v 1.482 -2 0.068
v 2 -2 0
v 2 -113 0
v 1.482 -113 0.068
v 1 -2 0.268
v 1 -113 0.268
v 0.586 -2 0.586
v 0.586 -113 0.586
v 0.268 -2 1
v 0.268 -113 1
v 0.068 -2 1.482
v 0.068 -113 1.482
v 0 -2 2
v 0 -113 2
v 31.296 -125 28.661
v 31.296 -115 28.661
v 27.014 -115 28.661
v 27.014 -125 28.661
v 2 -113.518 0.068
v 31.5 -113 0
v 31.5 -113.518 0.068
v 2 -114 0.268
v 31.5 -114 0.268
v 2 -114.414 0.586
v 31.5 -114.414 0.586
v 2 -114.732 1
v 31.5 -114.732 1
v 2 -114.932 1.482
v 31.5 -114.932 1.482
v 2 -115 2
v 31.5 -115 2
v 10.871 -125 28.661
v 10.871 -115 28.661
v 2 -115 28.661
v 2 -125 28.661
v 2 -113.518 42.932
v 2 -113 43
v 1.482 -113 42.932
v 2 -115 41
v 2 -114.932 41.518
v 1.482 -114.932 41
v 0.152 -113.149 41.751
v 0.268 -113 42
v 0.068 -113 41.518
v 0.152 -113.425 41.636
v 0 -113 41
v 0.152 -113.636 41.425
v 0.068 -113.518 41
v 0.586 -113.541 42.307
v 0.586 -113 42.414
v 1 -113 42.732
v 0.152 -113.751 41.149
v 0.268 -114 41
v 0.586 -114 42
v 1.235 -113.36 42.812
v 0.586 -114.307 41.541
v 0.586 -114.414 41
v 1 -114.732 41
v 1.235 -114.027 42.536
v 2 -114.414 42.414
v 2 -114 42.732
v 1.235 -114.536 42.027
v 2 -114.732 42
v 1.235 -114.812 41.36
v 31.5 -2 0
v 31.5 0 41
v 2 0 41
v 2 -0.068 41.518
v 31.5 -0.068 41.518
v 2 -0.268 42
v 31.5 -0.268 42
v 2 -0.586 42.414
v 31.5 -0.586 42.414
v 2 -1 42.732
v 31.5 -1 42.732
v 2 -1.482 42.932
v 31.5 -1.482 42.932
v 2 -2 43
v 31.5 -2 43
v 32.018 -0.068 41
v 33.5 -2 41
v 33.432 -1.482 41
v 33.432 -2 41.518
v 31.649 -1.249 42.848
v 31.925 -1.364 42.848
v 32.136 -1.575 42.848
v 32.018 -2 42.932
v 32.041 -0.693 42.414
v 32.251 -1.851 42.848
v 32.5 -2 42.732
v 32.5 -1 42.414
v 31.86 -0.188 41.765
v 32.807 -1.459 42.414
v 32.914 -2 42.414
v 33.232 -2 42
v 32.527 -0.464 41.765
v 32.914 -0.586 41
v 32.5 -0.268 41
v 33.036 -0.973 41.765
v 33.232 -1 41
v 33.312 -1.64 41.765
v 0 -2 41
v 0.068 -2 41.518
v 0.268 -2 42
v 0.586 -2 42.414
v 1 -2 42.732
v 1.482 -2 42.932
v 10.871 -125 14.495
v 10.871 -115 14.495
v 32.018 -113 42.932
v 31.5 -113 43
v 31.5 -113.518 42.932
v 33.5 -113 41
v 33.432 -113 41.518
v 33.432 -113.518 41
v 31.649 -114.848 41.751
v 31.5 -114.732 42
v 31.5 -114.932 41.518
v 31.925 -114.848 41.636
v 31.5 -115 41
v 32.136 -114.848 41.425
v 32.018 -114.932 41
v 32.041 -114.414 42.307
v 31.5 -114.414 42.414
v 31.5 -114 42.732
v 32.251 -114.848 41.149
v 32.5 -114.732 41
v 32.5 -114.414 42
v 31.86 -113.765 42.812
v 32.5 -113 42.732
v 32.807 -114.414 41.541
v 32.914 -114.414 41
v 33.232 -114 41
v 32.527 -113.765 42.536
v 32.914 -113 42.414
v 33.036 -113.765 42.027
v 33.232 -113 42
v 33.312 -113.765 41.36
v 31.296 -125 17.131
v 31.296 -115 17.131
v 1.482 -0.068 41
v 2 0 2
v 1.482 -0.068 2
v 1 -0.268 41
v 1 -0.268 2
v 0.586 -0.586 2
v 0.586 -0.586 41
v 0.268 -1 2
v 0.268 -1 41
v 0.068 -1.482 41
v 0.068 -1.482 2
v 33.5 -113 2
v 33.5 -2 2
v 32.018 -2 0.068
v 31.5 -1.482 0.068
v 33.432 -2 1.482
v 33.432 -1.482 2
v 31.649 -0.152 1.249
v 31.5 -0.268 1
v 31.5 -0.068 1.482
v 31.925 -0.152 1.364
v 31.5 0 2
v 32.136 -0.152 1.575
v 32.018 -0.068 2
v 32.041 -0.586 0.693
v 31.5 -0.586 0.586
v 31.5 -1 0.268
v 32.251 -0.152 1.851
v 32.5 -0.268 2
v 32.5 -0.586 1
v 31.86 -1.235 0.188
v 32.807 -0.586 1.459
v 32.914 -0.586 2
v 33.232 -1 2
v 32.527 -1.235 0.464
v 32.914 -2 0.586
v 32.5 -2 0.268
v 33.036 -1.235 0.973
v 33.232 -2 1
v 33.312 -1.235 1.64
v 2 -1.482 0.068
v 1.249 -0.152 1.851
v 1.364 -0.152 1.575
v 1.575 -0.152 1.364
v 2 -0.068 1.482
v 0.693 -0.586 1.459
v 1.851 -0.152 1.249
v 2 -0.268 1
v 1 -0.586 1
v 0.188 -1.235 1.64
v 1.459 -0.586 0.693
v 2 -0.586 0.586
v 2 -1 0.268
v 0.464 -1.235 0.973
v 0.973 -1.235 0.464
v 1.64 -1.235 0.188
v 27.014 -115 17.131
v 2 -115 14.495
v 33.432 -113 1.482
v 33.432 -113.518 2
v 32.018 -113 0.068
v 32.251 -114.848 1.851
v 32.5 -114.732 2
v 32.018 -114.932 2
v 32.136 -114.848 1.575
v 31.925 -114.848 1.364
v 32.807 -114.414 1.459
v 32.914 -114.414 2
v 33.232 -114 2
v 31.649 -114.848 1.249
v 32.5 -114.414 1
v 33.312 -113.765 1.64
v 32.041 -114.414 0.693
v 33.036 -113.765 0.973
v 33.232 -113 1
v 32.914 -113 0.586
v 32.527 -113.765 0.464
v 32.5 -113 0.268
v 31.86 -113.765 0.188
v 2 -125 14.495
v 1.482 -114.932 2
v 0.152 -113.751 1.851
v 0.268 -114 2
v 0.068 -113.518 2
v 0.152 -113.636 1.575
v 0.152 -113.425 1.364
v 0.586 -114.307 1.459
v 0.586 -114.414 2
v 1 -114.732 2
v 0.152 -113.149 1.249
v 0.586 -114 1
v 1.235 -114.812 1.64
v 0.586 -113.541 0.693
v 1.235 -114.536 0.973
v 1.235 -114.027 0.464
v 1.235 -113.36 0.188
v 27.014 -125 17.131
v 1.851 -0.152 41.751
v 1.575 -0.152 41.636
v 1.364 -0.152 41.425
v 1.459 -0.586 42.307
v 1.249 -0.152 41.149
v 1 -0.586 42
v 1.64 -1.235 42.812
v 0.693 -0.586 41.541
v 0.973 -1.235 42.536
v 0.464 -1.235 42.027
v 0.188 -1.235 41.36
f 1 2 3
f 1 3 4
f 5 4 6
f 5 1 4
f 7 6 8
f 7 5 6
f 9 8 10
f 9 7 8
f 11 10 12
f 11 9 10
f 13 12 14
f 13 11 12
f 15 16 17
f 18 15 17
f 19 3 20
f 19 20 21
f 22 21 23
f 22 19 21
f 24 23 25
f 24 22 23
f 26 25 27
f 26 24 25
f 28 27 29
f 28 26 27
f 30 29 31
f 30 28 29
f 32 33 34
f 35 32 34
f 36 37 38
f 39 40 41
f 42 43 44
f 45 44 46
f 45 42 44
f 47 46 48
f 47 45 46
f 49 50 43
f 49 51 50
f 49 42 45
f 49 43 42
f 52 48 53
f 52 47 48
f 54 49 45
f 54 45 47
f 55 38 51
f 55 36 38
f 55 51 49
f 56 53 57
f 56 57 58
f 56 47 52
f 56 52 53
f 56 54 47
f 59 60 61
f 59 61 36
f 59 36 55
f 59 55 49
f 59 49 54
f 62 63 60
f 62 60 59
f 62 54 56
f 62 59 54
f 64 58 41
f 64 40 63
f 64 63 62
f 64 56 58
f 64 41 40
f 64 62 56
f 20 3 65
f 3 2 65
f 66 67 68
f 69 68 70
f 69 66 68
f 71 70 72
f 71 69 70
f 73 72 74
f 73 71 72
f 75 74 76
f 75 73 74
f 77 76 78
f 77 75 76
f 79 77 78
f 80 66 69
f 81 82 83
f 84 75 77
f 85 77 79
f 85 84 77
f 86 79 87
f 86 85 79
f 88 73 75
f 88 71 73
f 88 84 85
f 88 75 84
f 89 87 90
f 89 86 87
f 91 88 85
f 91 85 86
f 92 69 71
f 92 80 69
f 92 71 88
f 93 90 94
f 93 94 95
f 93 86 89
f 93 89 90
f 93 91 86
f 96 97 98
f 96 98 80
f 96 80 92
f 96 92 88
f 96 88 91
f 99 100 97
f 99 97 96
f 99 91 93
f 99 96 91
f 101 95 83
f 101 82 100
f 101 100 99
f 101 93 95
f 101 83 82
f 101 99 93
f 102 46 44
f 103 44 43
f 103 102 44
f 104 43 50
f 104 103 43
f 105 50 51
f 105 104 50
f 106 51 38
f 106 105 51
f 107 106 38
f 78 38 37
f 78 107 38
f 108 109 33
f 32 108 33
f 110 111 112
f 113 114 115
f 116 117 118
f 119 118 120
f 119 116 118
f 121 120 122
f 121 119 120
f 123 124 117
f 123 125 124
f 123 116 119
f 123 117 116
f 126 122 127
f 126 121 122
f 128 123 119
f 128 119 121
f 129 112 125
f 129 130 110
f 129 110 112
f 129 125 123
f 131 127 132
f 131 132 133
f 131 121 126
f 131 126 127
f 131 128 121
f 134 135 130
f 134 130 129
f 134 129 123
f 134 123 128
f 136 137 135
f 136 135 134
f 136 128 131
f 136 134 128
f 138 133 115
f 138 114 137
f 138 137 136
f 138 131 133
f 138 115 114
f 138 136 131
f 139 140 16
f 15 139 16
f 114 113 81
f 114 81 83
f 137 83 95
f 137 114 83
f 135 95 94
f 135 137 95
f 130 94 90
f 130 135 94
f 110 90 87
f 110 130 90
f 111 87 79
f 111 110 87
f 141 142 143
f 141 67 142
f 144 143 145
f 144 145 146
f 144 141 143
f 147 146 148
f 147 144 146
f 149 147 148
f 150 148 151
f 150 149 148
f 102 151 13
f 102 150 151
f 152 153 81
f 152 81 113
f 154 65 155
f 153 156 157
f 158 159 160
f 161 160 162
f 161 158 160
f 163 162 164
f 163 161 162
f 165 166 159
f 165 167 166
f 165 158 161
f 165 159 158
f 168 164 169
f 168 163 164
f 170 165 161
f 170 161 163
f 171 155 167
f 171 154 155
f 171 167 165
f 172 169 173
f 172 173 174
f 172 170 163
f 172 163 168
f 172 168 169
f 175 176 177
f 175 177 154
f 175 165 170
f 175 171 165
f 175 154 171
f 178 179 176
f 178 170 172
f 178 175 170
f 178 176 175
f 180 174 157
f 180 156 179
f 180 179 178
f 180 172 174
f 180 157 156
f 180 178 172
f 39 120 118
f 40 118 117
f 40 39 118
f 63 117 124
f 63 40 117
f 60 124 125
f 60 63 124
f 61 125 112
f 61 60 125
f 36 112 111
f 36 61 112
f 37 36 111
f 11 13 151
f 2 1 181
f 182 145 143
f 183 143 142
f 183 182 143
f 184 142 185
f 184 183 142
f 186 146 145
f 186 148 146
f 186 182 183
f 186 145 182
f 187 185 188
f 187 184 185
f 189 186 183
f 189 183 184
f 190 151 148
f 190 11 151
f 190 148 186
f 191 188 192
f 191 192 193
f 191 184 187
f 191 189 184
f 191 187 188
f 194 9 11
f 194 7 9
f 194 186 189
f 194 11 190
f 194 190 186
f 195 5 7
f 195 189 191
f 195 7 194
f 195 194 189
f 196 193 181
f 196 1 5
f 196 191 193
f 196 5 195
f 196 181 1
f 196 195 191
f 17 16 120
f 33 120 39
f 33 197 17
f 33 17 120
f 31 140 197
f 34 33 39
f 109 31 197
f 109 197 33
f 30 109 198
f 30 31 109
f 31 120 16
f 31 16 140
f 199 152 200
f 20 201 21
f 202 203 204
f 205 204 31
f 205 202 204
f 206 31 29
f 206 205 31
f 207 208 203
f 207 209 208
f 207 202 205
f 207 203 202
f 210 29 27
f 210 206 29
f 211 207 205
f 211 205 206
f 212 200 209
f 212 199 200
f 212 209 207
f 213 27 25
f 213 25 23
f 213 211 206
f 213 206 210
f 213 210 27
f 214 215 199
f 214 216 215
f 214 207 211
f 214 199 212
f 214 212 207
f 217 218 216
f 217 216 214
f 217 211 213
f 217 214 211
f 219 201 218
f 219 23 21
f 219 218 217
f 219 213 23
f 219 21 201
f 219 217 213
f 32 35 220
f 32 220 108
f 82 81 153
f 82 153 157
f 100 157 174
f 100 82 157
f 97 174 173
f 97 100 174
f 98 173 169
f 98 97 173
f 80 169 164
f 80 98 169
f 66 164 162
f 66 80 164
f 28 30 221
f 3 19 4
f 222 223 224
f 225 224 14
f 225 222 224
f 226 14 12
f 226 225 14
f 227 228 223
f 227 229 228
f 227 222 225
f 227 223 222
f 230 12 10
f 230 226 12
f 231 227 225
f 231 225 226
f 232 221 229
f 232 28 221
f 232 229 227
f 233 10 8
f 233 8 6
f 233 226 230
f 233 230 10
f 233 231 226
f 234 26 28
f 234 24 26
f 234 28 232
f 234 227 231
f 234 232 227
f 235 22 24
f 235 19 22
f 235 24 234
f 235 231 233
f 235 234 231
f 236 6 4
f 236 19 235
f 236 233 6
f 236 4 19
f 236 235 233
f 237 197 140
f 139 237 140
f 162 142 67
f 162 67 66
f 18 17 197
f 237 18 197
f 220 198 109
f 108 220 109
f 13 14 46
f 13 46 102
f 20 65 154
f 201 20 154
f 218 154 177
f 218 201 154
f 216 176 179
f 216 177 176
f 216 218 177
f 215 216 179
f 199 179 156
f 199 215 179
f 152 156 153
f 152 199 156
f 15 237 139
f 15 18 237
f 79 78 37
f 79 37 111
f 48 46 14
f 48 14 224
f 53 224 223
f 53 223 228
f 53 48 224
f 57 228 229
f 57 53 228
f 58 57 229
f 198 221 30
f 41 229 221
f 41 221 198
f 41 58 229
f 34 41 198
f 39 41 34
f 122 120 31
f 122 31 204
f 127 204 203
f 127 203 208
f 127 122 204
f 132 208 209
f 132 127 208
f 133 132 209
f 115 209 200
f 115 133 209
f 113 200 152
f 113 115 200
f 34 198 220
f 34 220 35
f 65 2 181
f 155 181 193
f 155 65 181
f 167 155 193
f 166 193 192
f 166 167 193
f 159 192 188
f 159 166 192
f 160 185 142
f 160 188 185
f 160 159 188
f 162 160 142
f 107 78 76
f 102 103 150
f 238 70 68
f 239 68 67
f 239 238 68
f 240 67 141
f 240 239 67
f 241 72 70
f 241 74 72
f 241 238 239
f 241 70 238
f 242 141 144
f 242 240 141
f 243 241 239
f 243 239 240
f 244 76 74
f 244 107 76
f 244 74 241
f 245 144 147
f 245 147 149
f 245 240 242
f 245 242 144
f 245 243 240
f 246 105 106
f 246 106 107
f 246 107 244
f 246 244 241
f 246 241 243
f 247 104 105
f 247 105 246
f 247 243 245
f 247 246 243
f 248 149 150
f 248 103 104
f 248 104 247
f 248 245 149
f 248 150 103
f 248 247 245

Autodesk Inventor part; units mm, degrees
ref_plane "YZ Plane" through (0, 0, 0) normal (1, 0, 0) x (0, 1, 0)
ref_plane "XZ Plane" through (0, 0, 0) normal (0, 1, 0) x (-1, 0, 0)
ref_plane "XY Plane" through (0, 0, 0) normal (0, 0, 1) x (1, 0, 0)
sketch "Sketch1" plane through (0, 0, 0) normal (0, 0, 1) x (1, 0, 0)
  line L0 (0, 0) -> (33.5, 0)
  line L1 (33.5, 0) -> (33.5, -115)
  line L2 (33.5, -115) -> (0, -115)
  line L3 (0, -115) -> (0, 0)
  dimension "d0" = 115
  dimension "d1" = 33.5
extrude "Extrusion1" add sketch "Sketch1" along normal blind 43
fillet "Fillet1" radius 2 12 edges at (33.5, -57.5, 0) (33.5, 0, 21.5) (33.5, -57.5, 43) (33.5, -115, 21.5) (16.75, -115, 0) (16.75, -115, 43) (0, -115, 21.5) (0, -57.5, 0) (0, -57.5, 43) (0, 0, 21.5) (16.75, 0, 0) (16.75, 0, 43)
sketch "Sketch2" plane through (2, -115, 41) normal (0, -1, 0) x (1, 0, 0)
  line L0 (0, -39) -> (0, 0) projected
  line L1 (0, -26.5048) -> (8.8714, -26.5048)
  line L2 (8.8714, -26.5048) -> (8.8714, -12.339)
  line L3 (8.8714, -12.339) -> (0, -12.339)
  line L4 (0, -12.339) -> (0, -26.5048)
  line L5 (25.0138, -23.8693) -> (29.2965, -23.8693)
  line L6 (29.2965, -23.8693) -> (29.2965, -12.339)
  line L7 (29.2965, -12.339) -> (25.0138, -12.339)
  line L8 (25.0138, -12.339) -> (25.0138, -23.8693)
  point P0 (-2, -41)
  point P1 (0, -12.339)
extrude "Extrusion2" add sketch "Sketch2" along normal blind 10
properties part number "battery2500"
